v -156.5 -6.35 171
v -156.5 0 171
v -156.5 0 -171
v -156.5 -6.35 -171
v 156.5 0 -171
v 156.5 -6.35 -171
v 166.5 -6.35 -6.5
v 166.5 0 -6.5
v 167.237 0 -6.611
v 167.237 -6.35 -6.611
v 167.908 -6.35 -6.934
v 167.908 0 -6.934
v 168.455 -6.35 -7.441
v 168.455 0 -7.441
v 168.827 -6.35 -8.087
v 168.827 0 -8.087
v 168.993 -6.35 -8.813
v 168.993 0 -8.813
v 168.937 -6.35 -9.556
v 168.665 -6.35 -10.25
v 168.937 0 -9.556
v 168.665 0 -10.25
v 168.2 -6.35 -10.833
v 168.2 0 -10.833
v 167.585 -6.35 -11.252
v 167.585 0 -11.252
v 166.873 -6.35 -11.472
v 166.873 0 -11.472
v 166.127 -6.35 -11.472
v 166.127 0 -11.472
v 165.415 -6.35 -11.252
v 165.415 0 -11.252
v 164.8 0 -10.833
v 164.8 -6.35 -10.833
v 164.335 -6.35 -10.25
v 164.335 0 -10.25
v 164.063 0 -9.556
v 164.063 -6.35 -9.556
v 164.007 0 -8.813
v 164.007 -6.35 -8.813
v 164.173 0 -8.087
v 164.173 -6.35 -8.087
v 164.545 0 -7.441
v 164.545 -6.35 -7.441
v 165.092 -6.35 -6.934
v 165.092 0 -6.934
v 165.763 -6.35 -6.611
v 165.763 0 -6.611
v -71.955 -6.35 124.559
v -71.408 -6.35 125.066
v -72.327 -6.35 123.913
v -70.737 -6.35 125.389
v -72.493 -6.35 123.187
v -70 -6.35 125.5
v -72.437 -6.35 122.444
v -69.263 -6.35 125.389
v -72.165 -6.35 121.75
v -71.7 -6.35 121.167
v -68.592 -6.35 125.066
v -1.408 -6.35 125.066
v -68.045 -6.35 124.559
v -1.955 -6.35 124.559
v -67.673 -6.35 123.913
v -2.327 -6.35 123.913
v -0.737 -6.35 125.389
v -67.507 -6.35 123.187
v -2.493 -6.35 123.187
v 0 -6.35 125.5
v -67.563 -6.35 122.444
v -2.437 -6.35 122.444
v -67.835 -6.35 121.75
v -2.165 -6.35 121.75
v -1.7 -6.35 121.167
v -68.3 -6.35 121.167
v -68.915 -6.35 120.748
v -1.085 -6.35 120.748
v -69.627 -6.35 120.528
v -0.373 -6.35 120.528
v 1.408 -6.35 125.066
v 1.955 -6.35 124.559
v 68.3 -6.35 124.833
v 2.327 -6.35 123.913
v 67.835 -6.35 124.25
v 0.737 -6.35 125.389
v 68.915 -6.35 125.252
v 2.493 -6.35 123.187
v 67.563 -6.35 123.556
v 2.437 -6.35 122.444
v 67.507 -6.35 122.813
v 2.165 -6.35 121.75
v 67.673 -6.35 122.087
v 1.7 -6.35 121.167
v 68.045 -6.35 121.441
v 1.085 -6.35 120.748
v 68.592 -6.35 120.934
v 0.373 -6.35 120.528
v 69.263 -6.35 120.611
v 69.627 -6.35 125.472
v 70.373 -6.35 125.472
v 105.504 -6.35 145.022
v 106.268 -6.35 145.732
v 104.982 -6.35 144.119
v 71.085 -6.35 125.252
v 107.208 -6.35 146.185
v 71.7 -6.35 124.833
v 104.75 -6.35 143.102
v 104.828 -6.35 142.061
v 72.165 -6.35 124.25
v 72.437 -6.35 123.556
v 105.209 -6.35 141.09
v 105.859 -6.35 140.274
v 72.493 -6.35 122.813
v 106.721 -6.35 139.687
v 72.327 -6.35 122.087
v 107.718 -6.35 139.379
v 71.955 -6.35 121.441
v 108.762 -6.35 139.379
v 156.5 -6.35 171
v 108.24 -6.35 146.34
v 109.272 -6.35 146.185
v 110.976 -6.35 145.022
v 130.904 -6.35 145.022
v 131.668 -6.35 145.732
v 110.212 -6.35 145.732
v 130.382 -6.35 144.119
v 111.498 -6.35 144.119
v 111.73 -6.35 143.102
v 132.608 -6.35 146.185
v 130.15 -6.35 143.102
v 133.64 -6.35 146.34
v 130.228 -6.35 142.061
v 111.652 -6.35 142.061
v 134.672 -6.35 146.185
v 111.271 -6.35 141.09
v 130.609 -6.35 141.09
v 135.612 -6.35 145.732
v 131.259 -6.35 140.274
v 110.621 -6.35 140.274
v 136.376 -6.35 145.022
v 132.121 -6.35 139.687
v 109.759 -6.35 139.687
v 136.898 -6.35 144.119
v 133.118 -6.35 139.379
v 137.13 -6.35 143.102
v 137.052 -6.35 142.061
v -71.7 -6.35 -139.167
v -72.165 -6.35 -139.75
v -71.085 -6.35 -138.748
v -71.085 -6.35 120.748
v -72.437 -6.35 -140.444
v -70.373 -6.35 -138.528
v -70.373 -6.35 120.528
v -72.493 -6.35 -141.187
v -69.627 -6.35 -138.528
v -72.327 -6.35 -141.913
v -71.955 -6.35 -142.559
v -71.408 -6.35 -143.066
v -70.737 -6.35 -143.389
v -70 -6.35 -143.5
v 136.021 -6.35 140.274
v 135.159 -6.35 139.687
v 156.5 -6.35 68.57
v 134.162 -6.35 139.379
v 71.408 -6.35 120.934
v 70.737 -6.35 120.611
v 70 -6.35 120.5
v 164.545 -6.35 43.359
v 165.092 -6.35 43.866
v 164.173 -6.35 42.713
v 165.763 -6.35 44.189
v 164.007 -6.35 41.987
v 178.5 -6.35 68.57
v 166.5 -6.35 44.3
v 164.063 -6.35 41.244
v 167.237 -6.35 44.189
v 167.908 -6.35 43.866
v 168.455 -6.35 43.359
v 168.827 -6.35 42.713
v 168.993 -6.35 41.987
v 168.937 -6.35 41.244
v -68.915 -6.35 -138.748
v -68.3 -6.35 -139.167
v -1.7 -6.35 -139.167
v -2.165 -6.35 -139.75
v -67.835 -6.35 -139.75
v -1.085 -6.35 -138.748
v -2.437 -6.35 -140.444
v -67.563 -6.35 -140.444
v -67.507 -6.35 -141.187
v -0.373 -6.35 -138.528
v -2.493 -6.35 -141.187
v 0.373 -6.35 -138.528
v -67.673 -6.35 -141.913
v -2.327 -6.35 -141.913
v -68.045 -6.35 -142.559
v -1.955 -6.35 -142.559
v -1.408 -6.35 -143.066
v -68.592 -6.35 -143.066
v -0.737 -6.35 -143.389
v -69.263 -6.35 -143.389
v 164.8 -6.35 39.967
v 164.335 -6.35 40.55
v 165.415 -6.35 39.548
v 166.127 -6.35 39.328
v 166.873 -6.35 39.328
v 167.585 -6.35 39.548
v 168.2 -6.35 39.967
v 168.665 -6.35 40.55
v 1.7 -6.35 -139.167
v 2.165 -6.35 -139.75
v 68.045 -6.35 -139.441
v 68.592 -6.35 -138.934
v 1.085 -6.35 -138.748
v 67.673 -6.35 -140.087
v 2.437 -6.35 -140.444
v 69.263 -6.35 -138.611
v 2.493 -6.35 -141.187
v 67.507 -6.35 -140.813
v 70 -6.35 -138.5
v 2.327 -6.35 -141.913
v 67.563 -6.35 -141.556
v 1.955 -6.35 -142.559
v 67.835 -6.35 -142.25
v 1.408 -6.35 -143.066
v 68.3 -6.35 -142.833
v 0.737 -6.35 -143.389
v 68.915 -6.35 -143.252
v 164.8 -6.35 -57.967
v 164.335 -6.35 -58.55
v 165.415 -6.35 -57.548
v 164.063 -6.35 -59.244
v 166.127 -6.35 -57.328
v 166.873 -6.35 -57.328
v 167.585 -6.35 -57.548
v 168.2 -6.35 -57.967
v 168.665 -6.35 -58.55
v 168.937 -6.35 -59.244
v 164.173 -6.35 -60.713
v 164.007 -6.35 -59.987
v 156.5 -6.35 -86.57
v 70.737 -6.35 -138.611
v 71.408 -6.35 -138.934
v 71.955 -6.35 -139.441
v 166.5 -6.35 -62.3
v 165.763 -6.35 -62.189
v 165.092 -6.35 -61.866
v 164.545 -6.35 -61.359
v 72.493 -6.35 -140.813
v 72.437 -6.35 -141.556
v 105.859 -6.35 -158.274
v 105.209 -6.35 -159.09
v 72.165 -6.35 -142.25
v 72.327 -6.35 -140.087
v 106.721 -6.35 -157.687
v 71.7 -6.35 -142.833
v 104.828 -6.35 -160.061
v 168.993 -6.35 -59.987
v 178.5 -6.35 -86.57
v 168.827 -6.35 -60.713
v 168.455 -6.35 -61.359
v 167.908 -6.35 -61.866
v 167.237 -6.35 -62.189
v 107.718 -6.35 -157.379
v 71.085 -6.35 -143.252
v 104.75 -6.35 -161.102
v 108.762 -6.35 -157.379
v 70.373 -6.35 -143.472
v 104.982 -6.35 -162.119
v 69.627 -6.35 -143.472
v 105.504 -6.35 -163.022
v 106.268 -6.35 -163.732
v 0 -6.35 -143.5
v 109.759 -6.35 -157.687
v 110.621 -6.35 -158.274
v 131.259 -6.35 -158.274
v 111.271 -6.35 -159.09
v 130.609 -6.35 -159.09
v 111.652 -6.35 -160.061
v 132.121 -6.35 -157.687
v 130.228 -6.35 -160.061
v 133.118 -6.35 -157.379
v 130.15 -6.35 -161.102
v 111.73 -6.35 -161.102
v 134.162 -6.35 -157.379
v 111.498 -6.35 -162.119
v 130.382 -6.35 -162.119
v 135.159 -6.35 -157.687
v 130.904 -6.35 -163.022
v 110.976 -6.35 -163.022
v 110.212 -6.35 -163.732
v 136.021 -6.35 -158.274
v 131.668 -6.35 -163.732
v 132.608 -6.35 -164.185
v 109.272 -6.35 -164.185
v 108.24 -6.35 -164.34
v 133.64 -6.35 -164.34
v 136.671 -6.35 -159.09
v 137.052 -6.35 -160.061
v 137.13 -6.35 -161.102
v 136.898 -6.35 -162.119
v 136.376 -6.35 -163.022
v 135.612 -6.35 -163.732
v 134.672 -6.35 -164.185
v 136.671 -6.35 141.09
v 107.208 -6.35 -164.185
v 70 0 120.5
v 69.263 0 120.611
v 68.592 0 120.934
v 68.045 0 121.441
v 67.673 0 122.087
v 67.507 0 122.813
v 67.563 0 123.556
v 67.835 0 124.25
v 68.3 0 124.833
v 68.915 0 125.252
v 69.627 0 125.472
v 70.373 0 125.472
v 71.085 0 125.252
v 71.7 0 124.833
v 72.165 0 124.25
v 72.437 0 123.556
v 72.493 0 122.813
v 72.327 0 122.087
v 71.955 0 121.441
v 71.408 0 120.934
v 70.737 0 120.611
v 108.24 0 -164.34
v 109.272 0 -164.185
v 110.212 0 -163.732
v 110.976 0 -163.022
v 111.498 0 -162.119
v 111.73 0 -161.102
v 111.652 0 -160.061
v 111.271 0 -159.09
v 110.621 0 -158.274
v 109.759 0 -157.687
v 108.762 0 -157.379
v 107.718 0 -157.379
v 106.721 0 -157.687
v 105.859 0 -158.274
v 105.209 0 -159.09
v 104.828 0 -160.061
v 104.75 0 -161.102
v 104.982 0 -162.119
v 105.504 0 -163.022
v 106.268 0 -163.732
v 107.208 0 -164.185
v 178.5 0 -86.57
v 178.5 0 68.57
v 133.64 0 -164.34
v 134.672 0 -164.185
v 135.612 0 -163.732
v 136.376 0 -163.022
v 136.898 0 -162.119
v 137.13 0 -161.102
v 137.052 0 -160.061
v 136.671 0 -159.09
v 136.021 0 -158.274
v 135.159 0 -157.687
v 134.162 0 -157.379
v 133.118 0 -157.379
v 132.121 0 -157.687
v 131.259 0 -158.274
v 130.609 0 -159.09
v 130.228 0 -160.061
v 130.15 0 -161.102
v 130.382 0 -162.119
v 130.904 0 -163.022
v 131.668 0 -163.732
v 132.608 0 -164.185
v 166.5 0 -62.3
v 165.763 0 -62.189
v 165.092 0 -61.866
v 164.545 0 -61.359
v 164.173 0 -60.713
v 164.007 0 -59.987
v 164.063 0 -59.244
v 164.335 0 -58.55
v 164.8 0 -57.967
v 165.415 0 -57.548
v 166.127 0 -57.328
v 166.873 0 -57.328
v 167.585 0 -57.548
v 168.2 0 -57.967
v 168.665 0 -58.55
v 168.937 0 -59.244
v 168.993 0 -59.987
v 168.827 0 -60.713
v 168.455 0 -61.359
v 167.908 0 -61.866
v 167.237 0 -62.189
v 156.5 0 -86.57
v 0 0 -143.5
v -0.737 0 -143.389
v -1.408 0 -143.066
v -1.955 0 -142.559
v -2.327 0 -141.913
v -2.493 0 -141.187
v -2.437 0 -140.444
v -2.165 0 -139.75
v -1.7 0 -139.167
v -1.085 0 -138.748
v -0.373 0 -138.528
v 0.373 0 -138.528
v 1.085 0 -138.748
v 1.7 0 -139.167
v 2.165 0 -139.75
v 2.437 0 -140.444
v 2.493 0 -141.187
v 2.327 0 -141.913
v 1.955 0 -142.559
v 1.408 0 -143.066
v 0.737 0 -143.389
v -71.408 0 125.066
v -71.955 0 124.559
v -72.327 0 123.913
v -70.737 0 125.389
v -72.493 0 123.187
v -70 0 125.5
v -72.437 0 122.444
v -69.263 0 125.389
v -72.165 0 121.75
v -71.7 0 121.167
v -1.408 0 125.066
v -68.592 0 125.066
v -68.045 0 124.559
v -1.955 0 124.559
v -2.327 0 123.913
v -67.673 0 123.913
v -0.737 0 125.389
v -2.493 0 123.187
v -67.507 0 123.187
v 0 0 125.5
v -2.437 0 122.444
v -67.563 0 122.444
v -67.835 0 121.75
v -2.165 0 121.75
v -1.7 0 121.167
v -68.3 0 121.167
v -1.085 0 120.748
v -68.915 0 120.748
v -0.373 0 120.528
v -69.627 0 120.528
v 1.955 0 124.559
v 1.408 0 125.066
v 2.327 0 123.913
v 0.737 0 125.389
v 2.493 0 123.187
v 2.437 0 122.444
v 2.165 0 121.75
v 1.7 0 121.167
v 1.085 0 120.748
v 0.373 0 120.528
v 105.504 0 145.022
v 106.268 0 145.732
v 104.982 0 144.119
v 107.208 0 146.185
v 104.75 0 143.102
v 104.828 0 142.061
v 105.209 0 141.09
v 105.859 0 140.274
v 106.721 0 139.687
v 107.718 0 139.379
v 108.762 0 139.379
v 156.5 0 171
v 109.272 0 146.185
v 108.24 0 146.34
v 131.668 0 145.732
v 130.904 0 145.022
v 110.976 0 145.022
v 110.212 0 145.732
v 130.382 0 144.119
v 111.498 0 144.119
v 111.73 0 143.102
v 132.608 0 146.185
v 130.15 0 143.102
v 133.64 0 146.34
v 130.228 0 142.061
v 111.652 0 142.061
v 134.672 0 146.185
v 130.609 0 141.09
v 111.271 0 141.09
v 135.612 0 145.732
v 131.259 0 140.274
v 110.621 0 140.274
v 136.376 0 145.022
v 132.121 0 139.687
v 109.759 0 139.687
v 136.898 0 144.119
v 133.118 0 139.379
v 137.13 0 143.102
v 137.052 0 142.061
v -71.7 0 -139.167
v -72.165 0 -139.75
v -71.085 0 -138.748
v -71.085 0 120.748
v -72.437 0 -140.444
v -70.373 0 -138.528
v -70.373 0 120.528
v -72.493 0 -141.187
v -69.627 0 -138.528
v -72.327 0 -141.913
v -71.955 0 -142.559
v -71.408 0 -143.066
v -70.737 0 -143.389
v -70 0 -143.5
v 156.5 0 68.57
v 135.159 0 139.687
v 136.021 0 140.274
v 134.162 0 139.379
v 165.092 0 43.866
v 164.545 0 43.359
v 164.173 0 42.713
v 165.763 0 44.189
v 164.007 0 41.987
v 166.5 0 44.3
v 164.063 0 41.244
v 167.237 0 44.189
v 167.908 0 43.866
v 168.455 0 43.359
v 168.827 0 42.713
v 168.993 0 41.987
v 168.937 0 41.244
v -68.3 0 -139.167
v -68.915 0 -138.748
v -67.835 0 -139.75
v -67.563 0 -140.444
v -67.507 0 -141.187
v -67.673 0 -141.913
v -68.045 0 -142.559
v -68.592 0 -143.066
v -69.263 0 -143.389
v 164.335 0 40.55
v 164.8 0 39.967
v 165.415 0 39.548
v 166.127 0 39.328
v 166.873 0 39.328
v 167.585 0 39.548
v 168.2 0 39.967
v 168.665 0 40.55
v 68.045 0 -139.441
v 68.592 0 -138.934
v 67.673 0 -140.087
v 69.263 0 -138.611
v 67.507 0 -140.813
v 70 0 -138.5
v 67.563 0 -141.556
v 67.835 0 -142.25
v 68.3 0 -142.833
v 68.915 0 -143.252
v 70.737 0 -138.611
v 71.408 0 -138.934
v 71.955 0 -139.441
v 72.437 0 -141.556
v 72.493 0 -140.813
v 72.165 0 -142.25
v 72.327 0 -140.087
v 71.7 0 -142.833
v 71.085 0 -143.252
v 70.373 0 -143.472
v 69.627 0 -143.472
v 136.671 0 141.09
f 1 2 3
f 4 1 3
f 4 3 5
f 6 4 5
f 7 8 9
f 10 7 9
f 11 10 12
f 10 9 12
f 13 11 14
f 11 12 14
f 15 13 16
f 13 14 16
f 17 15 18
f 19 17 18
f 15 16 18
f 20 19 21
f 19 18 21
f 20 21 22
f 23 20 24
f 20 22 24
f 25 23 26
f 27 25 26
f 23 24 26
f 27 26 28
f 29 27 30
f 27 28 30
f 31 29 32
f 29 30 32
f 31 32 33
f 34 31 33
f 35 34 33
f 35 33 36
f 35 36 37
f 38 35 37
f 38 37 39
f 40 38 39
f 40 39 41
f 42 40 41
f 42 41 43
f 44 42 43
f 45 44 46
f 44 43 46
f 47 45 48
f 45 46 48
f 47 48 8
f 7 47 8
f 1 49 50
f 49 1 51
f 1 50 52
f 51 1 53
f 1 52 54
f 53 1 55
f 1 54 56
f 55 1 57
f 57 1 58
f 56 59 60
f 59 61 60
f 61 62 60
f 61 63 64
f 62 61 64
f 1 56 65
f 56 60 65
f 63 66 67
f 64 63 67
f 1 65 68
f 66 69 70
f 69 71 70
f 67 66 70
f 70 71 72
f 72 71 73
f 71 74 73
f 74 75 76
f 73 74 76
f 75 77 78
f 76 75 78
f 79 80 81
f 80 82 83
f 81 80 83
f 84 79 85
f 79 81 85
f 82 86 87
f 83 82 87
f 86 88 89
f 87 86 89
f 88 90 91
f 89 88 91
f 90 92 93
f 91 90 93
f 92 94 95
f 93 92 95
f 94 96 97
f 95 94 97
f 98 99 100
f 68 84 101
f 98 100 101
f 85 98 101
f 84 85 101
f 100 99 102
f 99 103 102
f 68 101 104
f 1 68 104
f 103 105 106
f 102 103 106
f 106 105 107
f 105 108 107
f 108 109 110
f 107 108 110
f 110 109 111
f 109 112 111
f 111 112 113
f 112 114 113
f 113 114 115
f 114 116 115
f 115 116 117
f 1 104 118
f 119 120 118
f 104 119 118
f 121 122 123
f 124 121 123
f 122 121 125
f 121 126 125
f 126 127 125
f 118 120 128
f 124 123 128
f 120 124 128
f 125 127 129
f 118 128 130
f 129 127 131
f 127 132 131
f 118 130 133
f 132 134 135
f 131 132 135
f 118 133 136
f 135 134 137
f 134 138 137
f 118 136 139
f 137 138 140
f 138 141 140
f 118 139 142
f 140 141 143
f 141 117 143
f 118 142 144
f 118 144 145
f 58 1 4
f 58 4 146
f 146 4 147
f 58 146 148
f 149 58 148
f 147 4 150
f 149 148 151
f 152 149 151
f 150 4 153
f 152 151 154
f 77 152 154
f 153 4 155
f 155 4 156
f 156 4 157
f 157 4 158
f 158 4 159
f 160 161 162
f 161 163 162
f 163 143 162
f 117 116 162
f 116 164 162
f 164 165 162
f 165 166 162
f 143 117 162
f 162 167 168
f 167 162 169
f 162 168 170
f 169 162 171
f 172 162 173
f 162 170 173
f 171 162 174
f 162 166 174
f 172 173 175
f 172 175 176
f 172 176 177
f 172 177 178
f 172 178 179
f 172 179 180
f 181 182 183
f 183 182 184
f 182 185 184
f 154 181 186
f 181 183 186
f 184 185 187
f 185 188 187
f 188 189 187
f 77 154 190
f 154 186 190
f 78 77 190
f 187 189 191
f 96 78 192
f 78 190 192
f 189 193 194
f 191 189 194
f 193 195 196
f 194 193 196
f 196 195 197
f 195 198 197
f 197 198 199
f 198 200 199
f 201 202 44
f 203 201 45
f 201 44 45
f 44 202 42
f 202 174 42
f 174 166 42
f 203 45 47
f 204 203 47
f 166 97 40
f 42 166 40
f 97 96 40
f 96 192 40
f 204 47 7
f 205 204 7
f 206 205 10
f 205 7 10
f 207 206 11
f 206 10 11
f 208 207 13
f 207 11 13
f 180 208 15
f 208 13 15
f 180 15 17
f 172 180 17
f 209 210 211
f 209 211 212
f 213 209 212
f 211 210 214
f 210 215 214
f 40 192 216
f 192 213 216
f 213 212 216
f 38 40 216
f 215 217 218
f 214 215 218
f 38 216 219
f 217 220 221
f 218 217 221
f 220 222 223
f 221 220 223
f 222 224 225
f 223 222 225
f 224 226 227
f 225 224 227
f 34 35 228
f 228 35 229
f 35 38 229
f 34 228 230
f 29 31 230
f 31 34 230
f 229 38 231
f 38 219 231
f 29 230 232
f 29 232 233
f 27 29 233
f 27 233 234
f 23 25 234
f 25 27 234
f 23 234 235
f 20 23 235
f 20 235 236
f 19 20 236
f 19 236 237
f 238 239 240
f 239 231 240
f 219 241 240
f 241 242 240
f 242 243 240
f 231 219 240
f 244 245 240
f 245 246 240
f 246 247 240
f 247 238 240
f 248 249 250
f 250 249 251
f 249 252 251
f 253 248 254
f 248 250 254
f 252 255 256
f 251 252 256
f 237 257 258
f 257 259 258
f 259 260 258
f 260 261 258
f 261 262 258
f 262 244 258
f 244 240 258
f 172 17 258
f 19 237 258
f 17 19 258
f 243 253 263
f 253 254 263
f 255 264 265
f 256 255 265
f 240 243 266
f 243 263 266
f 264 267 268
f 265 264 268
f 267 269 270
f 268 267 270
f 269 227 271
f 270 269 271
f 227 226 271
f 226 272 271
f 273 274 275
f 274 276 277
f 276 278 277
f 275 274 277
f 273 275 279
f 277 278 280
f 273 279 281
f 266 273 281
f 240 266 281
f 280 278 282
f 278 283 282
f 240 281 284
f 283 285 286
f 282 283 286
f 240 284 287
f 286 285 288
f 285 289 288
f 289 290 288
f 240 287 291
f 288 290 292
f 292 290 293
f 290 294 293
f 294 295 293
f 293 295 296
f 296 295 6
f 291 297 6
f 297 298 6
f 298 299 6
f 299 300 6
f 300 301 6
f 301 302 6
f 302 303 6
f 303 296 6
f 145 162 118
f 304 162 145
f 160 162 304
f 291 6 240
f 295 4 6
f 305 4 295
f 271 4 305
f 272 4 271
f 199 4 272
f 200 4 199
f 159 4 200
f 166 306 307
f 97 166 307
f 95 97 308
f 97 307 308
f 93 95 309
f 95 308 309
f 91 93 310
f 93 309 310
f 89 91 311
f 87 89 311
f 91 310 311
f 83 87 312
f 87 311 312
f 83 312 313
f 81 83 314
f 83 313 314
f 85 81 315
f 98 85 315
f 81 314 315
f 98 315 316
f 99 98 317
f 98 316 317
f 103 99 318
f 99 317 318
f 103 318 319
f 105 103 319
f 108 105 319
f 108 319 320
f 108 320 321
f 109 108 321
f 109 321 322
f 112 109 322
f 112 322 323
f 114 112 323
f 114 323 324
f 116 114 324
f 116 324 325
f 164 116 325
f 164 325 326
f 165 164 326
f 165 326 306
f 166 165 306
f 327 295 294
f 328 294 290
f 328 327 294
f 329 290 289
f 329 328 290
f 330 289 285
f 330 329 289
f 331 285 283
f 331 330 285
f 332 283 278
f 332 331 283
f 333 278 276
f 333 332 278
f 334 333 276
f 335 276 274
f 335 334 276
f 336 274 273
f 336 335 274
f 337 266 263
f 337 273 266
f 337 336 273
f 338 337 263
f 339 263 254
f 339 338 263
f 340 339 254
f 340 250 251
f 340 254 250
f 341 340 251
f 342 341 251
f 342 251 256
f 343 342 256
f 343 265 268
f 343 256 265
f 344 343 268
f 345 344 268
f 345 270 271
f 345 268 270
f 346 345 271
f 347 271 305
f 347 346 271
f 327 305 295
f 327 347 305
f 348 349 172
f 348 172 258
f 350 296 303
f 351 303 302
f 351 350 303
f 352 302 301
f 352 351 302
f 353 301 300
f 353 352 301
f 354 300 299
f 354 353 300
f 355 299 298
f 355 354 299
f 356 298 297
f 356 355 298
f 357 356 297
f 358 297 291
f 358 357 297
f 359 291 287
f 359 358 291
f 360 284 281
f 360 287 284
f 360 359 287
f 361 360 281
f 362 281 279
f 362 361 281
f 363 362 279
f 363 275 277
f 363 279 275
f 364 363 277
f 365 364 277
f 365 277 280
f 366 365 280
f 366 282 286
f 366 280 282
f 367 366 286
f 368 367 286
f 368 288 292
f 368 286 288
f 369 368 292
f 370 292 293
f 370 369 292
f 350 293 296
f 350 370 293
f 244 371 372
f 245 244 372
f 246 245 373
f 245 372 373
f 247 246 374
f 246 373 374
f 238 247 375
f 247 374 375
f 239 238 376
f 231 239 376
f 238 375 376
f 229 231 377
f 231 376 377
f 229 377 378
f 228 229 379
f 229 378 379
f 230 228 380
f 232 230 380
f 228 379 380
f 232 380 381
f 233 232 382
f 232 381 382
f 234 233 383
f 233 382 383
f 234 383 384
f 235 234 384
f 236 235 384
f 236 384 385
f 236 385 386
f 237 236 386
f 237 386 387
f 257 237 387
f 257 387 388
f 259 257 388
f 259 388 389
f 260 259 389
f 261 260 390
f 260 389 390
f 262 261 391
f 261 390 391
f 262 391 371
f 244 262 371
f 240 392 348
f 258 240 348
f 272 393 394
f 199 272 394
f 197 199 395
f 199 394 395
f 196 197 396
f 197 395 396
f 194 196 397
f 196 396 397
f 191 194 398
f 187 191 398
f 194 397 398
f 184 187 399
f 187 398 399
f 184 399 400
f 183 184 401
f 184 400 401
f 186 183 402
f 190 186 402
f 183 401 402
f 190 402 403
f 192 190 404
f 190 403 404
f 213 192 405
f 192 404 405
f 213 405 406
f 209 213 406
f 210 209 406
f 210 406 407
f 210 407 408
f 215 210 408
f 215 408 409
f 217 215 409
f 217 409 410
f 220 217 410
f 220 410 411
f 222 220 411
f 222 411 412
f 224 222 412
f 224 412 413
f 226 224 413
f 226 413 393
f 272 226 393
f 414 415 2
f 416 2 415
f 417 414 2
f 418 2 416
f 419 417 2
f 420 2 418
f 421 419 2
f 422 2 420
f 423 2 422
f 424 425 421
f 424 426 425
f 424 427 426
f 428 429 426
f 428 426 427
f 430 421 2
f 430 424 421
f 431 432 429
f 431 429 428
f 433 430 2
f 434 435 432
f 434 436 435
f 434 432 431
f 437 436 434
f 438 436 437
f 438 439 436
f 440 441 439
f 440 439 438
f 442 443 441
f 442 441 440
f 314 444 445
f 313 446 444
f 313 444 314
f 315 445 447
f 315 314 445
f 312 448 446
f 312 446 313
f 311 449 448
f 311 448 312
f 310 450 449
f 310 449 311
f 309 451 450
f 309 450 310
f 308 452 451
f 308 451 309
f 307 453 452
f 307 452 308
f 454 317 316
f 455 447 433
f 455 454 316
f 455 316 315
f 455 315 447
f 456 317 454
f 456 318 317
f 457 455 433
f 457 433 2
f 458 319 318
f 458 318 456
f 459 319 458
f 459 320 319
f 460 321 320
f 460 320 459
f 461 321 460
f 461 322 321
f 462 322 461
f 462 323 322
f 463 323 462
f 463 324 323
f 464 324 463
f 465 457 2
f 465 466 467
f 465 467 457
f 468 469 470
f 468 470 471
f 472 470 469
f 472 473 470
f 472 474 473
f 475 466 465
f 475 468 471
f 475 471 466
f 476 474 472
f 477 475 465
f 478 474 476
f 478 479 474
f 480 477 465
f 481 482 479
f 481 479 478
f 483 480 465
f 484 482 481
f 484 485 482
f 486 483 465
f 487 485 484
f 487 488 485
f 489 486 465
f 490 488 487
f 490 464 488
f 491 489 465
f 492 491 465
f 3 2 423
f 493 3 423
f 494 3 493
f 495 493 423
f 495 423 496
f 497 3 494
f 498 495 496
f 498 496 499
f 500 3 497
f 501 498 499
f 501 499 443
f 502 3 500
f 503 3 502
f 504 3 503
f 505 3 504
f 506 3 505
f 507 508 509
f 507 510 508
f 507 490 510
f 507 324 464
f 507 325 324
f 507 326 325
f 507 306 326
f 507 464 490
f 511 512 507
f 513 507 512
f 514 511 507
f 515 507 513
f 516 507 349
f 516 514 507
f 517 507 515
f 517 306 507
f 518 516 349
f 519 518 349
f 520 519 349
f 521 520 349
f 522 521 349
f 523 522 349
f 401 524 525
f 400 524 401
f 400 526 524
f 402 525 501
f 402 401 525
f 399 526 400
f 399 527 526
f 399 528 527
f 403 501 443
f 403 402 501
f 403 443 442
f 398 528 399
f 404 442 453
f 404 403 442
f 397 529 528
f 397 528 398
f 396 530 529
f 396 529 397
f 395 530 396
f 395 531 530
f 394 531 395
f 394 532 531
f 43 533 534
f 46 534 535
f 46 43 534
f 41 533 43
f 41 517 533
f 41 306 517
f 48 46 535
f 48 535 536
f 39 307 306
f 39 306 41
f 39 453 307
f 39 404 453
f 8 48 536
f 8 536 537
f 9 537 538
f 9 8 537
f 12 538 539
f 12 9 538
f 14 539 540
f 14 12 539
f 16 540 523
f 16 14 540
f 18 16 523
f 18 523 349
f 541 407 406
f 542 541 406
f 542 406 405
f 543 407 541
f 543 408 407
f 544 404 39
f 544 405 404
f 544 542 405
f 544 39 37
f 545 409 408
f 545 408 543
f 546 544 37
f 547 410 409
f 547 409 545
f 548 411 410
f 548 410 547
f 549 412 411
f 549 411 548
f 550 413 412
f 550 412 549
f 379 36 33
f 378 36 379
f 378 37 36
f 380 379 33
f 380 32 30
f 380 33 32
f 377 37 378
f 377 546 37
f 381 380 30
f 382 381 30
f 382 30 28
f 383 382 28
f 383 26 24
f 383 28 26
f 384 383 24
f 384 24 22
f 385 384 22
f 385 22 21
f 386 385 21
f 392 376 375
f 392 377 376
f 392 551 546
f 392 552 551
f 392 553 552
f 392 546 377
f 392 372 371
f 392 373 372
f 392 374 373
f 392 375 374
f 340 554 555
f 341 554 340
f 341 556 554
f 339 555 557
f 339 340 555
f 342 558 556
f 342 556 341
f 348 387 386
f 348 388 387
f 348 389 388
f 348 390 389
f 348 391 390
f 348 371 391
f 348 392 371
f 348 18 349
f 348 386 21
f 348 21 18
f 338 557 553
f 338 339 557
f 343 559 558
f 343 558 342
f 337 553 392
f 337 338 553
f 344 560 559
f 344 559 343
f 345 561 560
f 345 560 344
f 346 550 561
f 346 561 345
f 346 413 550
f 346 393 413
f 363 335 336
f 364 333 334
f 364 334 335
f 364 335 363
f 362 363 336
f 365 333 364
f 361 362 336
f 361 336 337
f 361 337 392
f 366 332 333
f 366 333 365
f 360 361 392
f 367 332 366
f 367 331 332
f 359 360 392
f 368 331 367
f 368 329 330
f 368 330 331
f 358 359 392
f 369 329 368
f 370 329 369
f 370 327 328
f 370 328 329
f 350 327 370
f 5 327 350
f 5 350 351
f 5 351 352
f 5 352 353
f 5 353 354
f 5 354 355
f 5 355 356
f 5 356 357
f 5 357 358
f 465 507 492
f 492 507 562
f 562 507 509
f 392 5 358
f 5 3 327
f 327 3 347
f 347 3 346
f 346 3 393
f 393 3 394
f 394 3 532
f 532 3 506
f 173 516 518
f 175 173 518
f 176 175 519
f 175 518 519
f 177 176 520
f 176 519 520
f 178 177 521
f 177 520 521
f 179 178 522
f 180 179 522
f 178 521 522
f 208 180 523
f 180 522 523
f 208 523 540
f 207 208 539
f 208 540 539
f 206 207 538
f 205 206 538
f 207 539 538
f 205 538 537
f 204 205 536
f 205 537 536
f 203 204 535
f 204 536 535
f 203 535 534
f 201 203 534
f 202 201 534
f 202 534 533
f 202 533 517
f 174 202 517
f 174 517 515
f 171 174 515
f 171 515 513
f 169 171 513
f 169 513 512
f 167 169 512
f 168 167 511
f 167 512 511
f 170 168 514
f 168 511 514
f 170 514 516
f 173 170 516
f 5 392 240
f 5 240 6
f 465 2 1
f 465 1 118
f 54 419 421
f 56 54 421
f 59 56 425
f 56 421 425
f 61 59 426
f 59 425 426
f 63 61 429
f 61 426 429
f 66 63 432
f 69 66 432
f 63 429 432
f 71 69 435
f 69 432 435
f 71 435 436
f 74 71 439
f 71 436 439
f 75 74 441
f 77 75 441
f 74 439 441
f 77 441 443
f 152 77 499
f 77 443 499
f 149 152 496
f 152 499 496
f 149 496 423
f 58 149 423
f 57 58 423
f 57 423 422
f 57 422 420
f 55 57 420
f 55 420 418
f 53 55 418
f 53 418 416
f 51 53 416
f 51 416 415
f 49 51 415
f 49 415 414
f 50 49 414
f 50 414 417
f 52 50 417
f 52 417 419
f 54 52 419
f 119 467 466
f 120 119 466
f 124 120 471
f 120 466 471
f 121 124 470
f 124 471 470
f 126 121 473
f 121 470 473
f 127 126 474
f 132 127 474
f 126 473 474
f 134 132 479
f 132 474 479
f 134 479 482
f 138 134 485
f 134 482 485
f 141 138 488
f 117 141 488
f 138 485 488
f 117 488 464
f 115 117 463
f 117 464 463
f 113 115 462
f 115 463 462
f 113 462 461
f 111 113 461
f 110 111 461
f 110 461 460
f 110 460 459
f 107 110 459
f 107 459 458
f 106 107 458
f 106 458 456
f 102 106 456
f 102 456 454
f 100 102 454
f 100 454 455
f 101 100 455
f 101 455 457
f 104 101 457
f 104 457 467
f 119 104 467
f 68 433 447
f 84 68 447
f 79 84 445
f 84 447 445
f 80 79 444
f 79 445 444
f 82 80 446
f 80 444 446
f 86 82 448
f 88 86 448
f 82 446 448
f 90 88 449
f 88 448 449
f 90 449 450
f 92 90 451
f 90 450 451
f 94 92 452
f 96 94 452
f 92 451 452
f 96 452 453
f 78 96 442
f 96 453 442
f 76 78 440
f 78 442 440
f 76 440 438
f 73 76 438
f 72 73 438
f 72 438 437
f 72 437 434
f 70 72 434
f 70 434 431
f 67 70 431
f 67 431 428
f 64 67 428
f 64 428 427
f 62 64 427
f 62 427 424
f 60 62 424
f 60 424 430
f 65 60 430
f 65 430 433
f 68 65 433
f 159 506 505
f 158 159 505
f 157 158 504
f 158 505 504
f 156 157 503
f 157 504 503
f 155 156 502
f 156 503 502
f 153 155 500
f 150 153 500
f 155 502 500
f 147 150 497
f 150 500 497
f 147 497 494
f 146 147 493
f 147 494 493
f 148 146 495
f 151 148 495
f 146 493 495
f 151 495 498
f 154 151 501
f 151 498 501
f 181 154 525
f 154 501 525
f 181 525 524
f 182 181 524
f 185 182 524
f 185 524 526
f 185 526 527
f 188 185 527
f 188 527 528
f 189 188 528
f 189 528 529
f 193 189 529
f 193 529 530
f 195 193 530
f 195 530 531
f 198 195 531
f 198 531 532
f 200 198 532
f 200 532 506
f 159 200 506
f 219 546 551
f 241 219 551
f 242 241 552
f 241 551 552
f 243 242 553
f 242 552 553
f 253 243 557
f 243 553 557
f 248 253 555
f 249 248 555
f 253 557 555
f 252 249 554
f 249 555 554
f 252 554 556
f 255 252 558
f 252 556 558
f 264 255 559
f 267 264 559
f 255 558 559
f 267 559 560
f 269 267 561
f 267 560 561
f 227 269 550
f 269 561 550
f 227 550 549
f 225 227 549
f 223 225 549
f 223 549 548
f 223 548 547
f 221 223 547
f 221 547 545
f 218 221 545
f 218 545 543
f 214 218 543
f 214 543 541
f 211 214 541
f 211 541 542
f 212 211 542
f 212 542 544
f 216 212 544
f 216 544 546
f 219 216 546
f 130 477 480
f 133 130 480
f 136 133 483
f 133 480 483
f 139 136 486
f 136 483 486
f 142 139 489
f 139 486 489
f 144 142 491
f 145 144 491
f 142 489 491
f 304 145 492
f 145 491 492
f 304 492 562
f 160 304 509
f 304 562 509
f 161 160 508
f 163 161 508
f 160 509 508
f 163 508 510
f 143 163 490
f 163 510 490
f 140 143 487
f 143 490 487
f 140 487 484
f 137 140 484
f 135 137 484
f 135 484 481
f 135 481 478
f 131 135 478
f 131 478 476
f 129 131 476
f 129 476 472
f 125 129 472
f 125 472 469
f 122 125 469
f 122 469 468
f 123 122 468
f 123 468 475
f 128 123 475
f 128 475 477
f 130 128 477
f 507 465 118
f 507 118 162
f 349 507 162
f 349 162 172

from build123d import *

# Parameters (mm, degrees)
SKETCH1_W           = 313
SKETCH1_H           = 342
BOSS_EXTRUDE1_DEPTH = 6.35
SKETCH3_W           = 22
SKETCH3_H           = 155.14040353
SKETCH3_R           = 2.5
BOSS_EXTRUDE2_DEPTH = 6.35
SKETCH2_R           = 2.5
CUT_EXTRUDE1_DEPTH  = 248.272263912
SKETCH4_R           = 3.5
CUT_EXTRUDE2_DEPTH  = 248.272263912


with BuildPart() as part:
    # Sketch1 → Boss-Extrude1 (new body)
    with BuildSketch(Plane(origin=(0, 0, 0), x_dir=(1, 0, 0), z_dir=(0, 1, 0))):
        Rectangle(SKETCH1_W, SKETCH1_H)
    extrude(amount=-BOSS_EXTRUDE1_DEPTH)

    # Sketch3 → Boss-Extrude2 (add)
    with BuildSketch(Plane(origin=(0, 0, 0), x_dir=(1, 0, 0), z_dir=(0, 1, 0))):
        with Locations((167.5, 9)):
            Rectangle(SKETCH3_W, SKETCH3_H)
        with Locations((166.5, 9)):
            Circle(SKETCH3_R, mode=Mode.SUBTRACT)
        with Locations((166.5, -41.8)):
            Circle(SKETCH3_R, mode=Mode.SUBTRACT)
        with Locations((166.5, 59.8)):
            Circle(SKETCH3_R, mode=Mode.SUBTRACT)
    extrude(amount=-BOSS_EXTRUDE2_DEPTH)

    # Sketch2 → Cut-Extrude1 (cut, through all)
    with BuildSketch(Plane(origin=(0, 0, 0), x_dir=(1, 0, 0), z_dir=(0, 1, 0))):
        with Locations((0, -123)):
            Circle(SKETCH2_R)
        with Locations((-70, -123)):
            Circle(SKETCH2_R)
        with Locations((70, -123)):
            Circle(SKETCH2_R)
        with Locations((-70, 141)):
            Circle(SKETCH2_R)
        with Locations((0, 141)):
            Circle(SKETCH2_R)
        with Locations((70, 141)):
            Circle(SKETCH2_R)
    extrude(amount=-CUT_EXTRUDE1_DEPTH, mode=Mode.SUBTRACT)

    # Sketch4 → Cut-Extrude2 (cut, through all)
    with BuildSketch(Plane(origin=(0, 0, 0), x_dir=(1, 0, 0), z_dir=(0, 1, 0))):
        with Locations((133.64, -142.84)):
            Circle(SKETCH4_R)
        with Locations((108.24, -142.84)):
            Circle(SKETCH4_R)
    cut_extrude2 = extrude(amount=-CUT_EXTRUDE2_DEPTH, mode=Mode.SUBTRACT)

    # Mirror1: Cut-Extrude2 across plane
    add(cut_extrude2.mirror(Plane(origin=(0, 0, -9), x_dir=(1, 0, 0), z_dir=(0, 0, -1))), mode=Mode.SUBTRACT)


solid = part.part
